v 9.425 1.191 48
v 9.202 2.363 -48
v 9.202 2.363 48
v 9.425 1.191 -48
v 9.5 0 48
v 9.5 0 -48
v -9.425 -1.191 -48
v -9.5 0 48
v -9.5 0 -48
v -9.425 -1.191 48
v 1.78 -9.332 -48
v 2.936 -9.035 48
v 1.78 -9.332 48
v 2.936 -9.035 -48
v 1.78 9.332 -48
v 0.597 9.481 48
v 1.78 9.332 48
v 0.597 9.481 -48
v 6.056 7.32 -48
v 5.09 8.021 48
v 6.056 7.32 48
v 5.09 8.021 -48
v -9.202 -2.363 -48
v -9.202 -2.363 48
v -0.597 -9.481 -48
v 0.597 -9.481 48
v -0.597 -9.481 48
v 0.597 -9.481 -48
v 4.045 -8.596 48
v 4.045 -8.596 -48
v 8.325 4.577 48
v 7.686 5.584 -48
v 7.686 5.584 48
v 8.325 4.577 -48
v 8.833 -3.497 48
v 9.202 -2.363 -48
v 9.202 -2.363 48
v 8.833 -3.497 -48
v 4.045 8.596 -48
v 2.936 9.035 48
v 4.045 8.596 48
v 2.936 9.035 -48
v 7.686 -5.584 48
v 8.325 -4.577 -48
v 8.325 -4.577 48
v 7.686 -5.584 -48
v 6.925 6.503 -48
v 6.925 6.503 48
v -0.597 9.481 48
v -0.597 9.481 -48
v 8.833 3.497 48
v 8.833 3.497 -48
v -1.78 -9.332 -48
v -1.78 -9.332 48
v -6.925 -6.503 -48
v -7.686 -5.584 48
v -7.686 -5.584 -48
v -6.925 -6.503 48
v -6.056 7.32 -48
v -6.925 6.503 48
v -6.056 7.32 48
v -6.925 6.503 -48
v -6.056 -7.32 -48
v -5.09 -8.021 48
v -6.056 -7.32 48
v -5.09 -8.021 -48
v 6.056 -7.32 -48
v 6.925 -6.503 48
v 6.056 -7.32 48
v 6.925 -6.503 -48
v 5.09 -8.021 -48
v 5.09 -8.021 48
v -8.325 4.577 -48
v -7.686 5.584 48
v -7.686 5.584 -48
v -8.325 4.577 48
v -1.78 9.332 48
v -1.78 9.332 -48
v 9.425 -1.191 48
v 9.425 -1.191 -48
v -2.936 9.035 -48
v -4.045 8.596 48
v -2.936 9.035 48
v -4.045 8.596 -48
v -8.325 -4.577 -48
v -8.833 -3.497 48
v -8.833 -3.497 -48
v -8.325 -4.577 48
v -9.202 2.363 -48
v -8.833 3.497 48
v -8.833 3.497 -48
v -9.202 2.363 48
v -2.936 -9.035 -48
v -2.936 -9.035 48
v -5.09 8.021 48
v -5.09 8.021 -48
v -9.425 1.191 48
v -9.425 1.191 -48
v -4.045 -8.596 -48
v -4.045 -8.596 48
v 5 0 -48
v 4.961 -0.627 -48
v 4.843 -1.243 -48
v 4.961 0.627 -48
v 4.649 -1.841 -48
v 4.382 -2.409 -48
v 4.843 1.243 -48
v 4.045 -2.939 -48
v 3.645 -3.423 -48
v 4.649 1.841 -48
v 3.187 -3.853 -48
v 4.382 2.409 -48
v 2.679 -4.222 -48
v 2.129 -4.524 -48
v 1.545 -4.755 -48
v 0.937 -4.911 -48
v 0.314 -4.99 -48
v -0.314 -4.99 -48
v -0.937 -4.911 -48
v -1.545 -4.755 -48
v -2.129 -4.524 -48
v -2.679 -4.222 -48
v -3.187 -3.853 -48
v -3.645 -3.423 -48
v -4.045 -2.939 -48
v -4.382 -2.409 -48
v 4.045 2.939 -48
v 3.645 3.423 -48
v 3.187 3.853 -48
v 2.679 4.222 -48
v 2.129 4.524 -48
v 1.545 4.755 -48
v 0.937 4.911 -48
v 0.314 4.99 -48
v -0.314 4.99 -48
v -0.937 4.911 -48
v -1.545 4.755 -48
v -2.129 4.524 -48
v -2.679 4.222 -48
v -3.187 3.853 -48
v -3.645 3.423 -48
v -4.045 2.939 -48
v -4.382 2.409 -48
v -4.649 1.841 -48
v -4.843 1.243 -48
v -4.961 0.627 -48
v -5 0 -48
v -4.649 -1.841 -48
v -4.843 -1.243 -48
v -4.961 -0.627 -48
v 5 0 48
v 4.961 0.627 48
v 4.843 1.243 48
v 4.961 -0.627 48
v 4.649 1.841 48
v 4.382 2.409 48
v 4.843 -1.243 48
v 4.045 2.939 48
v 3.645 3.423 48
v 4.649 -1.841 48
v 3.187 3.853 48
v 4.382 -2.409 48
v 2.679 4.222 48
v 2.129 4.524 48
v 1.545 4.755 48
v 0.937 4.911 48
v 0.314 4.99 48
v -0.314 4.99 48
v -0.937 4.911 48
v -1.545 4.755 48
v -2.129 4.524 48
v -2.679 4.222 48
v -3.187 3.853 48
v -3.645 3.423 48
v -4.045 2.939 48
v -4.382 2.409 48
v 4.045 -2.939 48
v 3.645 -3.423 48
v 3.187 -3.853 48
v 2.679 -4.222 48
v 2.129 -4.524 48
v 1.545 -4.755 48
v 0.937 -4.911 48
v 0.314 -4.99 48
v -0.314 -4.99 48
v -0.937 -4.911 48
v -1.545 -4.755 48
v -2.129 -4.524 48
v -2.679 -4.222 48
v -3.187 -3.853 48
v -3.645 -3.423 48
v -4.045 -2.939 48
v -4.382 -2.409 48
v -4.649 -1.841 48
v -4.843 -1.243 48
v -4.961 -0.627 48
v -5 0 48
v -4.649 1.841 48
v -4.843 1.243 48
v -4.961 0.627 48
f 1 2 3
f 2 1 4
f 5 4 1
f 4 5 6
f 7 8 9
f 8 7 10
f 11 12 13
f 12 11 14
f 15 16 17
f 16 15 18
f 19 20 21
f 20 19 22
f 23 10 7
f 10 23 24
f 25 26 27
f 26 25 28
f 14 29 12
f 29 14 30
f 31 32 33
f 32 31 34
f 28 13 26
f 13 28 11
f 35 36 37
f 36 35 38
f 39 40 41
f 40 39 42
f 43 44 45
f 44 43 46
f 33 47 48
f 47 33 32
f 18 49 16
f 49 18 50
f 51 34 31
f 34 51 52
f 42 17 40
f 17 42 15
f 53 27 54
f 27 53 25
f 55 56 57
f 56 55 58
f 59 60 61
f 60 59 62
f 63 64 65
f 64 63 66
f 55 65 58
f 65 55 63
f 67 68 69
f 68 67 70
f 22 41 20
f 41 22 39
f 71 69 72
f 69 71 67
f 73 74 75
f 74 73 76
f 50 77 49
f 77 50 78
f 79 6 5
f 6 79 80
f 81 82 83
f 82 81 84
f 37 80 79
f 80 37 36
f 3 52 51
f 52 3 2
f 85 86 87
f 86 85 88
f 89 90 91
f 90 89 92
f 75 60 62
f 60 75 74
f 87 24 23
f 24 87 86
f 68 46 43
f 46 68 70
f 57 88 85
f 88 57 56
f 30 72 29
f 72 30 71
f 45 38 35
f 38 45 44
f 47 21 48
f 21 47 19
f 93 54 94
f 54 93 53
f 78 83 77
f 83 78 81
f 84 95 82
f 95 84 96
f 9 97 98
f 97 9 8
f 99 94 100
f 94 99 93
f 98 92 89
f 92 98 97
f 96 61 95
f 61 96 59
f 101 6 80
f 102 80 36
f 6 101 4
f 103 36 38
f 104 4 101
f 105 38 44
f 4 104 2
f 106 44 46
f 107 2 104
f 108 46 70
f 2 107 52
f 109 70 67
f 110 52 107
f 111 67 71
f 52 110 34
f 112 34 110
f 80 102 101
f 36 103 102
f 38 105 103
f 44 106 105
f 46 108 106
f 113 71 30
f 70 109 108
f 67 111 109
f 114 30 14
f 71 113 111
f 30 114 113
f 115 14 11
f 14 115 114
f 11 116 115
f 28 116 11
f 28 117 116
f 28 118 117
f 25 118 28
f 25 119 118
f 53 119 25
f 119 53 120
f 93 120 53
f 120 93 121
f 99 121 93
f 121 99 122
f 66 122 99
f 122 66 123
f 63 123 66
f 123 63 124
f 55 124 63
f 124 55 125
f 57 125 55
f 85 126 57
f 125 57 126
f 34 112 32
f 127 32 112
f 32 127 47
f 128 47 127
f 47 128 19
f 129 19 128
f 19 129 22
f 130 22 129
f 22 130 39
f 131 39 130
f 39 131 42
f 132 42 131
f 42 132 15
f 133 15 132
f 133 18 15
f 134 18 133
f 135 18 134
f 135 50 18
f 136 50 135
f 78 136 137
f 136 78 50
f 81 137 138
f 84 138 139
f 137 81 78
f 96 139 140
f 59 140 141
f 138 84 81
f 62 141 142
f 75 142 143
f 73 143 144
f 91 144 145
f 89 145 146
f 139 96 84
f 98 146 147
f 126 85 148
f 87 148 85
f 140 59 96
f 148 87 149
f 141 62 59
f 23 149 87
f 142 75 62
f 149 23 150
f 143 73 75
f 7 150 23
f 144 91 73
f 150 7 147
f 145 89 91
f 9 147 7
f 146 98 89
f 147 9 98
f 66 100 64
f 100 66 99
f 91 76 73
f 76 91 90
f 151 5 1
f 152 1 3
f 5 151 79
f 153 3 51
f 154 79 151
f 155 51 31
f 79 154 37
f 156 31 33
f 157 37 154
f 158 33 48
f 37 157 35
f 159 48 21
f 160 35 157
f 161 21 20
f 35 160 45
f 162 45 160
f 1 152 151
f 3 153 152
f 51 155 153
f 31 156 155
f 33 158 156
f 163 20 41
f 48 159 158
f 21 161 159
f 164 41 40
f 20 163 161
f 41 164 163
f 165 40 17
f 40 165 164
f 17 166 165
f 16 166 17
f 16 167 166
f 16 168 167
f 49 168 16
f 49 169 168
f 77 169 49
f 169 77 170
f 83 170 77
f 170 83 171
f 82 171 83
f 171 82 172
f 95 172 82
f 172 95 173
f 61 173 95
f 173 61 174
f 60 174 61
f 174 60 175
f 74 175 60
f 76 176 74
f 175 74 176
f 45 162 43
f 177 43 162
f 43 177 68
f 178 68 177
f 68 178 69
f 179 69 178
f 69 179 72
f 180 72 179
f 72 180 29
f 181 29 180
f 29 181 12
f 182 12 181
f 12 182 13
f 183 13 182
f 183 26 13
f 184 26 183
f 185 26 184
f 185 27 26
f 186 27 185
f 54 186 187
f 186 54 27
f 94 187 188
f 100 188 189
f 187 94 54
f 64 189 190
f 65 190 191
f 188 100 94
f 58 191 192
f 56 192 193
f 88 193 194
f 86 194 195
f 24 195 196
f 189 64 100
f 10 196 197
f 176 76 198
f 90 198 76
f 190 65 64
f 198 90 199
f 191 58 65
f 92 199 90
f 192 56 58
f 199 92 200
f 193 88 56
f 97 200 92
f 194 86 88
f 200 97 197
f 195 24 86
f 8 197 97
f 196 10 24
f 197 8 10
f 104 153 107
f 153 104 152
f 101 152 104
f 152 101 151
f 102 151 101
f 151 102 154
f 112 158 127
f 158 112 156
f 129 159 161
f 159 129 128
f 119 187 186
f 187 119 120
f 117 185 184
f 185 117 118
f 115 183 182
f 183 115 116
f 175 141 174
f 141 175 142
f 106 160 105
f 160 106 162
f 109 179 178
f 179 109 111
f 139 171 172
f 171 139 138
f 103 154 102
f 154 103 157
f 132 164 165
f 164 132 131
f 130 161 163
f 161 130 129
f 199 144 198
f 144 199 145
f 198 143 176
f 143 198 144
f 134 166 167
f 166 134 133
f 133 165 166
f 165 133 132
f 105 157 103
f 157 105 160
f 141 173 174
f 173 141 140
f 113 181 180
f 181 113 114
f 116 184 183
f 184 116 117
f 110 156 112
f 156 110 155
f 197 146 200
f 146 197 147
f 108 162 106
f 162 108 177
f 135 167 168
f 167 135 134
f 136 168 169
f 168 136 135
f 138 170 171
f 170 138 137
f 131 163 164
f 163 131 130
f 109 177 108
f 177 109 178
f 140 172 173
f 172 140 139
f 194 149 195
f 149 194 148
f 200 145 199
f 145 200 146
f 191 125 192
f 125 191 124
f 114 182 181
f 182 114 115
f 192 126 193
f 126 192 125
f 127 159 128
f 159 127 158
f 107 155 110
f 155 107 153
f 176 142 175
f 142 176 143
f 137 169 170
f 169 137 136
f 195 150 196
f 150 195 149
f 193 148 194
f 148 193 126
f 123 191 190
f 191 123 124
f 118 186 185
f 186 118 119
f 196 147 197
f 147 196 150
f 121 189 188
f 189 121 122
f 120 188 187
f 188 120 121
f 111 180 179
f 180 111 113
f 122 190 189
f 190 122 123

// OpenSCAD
$fn = 50;


difference() {
	union() {
		translate(v = [0, 0, -48.0000000000]) {
			cylinder(h = 96, r = 9.5000000000);
		}
	}
	union() {
		translate(v = [0, 0, -100.0000000000]) {
			cylinder(h = 200, r = 5.0000000000);
		}
	}
}
